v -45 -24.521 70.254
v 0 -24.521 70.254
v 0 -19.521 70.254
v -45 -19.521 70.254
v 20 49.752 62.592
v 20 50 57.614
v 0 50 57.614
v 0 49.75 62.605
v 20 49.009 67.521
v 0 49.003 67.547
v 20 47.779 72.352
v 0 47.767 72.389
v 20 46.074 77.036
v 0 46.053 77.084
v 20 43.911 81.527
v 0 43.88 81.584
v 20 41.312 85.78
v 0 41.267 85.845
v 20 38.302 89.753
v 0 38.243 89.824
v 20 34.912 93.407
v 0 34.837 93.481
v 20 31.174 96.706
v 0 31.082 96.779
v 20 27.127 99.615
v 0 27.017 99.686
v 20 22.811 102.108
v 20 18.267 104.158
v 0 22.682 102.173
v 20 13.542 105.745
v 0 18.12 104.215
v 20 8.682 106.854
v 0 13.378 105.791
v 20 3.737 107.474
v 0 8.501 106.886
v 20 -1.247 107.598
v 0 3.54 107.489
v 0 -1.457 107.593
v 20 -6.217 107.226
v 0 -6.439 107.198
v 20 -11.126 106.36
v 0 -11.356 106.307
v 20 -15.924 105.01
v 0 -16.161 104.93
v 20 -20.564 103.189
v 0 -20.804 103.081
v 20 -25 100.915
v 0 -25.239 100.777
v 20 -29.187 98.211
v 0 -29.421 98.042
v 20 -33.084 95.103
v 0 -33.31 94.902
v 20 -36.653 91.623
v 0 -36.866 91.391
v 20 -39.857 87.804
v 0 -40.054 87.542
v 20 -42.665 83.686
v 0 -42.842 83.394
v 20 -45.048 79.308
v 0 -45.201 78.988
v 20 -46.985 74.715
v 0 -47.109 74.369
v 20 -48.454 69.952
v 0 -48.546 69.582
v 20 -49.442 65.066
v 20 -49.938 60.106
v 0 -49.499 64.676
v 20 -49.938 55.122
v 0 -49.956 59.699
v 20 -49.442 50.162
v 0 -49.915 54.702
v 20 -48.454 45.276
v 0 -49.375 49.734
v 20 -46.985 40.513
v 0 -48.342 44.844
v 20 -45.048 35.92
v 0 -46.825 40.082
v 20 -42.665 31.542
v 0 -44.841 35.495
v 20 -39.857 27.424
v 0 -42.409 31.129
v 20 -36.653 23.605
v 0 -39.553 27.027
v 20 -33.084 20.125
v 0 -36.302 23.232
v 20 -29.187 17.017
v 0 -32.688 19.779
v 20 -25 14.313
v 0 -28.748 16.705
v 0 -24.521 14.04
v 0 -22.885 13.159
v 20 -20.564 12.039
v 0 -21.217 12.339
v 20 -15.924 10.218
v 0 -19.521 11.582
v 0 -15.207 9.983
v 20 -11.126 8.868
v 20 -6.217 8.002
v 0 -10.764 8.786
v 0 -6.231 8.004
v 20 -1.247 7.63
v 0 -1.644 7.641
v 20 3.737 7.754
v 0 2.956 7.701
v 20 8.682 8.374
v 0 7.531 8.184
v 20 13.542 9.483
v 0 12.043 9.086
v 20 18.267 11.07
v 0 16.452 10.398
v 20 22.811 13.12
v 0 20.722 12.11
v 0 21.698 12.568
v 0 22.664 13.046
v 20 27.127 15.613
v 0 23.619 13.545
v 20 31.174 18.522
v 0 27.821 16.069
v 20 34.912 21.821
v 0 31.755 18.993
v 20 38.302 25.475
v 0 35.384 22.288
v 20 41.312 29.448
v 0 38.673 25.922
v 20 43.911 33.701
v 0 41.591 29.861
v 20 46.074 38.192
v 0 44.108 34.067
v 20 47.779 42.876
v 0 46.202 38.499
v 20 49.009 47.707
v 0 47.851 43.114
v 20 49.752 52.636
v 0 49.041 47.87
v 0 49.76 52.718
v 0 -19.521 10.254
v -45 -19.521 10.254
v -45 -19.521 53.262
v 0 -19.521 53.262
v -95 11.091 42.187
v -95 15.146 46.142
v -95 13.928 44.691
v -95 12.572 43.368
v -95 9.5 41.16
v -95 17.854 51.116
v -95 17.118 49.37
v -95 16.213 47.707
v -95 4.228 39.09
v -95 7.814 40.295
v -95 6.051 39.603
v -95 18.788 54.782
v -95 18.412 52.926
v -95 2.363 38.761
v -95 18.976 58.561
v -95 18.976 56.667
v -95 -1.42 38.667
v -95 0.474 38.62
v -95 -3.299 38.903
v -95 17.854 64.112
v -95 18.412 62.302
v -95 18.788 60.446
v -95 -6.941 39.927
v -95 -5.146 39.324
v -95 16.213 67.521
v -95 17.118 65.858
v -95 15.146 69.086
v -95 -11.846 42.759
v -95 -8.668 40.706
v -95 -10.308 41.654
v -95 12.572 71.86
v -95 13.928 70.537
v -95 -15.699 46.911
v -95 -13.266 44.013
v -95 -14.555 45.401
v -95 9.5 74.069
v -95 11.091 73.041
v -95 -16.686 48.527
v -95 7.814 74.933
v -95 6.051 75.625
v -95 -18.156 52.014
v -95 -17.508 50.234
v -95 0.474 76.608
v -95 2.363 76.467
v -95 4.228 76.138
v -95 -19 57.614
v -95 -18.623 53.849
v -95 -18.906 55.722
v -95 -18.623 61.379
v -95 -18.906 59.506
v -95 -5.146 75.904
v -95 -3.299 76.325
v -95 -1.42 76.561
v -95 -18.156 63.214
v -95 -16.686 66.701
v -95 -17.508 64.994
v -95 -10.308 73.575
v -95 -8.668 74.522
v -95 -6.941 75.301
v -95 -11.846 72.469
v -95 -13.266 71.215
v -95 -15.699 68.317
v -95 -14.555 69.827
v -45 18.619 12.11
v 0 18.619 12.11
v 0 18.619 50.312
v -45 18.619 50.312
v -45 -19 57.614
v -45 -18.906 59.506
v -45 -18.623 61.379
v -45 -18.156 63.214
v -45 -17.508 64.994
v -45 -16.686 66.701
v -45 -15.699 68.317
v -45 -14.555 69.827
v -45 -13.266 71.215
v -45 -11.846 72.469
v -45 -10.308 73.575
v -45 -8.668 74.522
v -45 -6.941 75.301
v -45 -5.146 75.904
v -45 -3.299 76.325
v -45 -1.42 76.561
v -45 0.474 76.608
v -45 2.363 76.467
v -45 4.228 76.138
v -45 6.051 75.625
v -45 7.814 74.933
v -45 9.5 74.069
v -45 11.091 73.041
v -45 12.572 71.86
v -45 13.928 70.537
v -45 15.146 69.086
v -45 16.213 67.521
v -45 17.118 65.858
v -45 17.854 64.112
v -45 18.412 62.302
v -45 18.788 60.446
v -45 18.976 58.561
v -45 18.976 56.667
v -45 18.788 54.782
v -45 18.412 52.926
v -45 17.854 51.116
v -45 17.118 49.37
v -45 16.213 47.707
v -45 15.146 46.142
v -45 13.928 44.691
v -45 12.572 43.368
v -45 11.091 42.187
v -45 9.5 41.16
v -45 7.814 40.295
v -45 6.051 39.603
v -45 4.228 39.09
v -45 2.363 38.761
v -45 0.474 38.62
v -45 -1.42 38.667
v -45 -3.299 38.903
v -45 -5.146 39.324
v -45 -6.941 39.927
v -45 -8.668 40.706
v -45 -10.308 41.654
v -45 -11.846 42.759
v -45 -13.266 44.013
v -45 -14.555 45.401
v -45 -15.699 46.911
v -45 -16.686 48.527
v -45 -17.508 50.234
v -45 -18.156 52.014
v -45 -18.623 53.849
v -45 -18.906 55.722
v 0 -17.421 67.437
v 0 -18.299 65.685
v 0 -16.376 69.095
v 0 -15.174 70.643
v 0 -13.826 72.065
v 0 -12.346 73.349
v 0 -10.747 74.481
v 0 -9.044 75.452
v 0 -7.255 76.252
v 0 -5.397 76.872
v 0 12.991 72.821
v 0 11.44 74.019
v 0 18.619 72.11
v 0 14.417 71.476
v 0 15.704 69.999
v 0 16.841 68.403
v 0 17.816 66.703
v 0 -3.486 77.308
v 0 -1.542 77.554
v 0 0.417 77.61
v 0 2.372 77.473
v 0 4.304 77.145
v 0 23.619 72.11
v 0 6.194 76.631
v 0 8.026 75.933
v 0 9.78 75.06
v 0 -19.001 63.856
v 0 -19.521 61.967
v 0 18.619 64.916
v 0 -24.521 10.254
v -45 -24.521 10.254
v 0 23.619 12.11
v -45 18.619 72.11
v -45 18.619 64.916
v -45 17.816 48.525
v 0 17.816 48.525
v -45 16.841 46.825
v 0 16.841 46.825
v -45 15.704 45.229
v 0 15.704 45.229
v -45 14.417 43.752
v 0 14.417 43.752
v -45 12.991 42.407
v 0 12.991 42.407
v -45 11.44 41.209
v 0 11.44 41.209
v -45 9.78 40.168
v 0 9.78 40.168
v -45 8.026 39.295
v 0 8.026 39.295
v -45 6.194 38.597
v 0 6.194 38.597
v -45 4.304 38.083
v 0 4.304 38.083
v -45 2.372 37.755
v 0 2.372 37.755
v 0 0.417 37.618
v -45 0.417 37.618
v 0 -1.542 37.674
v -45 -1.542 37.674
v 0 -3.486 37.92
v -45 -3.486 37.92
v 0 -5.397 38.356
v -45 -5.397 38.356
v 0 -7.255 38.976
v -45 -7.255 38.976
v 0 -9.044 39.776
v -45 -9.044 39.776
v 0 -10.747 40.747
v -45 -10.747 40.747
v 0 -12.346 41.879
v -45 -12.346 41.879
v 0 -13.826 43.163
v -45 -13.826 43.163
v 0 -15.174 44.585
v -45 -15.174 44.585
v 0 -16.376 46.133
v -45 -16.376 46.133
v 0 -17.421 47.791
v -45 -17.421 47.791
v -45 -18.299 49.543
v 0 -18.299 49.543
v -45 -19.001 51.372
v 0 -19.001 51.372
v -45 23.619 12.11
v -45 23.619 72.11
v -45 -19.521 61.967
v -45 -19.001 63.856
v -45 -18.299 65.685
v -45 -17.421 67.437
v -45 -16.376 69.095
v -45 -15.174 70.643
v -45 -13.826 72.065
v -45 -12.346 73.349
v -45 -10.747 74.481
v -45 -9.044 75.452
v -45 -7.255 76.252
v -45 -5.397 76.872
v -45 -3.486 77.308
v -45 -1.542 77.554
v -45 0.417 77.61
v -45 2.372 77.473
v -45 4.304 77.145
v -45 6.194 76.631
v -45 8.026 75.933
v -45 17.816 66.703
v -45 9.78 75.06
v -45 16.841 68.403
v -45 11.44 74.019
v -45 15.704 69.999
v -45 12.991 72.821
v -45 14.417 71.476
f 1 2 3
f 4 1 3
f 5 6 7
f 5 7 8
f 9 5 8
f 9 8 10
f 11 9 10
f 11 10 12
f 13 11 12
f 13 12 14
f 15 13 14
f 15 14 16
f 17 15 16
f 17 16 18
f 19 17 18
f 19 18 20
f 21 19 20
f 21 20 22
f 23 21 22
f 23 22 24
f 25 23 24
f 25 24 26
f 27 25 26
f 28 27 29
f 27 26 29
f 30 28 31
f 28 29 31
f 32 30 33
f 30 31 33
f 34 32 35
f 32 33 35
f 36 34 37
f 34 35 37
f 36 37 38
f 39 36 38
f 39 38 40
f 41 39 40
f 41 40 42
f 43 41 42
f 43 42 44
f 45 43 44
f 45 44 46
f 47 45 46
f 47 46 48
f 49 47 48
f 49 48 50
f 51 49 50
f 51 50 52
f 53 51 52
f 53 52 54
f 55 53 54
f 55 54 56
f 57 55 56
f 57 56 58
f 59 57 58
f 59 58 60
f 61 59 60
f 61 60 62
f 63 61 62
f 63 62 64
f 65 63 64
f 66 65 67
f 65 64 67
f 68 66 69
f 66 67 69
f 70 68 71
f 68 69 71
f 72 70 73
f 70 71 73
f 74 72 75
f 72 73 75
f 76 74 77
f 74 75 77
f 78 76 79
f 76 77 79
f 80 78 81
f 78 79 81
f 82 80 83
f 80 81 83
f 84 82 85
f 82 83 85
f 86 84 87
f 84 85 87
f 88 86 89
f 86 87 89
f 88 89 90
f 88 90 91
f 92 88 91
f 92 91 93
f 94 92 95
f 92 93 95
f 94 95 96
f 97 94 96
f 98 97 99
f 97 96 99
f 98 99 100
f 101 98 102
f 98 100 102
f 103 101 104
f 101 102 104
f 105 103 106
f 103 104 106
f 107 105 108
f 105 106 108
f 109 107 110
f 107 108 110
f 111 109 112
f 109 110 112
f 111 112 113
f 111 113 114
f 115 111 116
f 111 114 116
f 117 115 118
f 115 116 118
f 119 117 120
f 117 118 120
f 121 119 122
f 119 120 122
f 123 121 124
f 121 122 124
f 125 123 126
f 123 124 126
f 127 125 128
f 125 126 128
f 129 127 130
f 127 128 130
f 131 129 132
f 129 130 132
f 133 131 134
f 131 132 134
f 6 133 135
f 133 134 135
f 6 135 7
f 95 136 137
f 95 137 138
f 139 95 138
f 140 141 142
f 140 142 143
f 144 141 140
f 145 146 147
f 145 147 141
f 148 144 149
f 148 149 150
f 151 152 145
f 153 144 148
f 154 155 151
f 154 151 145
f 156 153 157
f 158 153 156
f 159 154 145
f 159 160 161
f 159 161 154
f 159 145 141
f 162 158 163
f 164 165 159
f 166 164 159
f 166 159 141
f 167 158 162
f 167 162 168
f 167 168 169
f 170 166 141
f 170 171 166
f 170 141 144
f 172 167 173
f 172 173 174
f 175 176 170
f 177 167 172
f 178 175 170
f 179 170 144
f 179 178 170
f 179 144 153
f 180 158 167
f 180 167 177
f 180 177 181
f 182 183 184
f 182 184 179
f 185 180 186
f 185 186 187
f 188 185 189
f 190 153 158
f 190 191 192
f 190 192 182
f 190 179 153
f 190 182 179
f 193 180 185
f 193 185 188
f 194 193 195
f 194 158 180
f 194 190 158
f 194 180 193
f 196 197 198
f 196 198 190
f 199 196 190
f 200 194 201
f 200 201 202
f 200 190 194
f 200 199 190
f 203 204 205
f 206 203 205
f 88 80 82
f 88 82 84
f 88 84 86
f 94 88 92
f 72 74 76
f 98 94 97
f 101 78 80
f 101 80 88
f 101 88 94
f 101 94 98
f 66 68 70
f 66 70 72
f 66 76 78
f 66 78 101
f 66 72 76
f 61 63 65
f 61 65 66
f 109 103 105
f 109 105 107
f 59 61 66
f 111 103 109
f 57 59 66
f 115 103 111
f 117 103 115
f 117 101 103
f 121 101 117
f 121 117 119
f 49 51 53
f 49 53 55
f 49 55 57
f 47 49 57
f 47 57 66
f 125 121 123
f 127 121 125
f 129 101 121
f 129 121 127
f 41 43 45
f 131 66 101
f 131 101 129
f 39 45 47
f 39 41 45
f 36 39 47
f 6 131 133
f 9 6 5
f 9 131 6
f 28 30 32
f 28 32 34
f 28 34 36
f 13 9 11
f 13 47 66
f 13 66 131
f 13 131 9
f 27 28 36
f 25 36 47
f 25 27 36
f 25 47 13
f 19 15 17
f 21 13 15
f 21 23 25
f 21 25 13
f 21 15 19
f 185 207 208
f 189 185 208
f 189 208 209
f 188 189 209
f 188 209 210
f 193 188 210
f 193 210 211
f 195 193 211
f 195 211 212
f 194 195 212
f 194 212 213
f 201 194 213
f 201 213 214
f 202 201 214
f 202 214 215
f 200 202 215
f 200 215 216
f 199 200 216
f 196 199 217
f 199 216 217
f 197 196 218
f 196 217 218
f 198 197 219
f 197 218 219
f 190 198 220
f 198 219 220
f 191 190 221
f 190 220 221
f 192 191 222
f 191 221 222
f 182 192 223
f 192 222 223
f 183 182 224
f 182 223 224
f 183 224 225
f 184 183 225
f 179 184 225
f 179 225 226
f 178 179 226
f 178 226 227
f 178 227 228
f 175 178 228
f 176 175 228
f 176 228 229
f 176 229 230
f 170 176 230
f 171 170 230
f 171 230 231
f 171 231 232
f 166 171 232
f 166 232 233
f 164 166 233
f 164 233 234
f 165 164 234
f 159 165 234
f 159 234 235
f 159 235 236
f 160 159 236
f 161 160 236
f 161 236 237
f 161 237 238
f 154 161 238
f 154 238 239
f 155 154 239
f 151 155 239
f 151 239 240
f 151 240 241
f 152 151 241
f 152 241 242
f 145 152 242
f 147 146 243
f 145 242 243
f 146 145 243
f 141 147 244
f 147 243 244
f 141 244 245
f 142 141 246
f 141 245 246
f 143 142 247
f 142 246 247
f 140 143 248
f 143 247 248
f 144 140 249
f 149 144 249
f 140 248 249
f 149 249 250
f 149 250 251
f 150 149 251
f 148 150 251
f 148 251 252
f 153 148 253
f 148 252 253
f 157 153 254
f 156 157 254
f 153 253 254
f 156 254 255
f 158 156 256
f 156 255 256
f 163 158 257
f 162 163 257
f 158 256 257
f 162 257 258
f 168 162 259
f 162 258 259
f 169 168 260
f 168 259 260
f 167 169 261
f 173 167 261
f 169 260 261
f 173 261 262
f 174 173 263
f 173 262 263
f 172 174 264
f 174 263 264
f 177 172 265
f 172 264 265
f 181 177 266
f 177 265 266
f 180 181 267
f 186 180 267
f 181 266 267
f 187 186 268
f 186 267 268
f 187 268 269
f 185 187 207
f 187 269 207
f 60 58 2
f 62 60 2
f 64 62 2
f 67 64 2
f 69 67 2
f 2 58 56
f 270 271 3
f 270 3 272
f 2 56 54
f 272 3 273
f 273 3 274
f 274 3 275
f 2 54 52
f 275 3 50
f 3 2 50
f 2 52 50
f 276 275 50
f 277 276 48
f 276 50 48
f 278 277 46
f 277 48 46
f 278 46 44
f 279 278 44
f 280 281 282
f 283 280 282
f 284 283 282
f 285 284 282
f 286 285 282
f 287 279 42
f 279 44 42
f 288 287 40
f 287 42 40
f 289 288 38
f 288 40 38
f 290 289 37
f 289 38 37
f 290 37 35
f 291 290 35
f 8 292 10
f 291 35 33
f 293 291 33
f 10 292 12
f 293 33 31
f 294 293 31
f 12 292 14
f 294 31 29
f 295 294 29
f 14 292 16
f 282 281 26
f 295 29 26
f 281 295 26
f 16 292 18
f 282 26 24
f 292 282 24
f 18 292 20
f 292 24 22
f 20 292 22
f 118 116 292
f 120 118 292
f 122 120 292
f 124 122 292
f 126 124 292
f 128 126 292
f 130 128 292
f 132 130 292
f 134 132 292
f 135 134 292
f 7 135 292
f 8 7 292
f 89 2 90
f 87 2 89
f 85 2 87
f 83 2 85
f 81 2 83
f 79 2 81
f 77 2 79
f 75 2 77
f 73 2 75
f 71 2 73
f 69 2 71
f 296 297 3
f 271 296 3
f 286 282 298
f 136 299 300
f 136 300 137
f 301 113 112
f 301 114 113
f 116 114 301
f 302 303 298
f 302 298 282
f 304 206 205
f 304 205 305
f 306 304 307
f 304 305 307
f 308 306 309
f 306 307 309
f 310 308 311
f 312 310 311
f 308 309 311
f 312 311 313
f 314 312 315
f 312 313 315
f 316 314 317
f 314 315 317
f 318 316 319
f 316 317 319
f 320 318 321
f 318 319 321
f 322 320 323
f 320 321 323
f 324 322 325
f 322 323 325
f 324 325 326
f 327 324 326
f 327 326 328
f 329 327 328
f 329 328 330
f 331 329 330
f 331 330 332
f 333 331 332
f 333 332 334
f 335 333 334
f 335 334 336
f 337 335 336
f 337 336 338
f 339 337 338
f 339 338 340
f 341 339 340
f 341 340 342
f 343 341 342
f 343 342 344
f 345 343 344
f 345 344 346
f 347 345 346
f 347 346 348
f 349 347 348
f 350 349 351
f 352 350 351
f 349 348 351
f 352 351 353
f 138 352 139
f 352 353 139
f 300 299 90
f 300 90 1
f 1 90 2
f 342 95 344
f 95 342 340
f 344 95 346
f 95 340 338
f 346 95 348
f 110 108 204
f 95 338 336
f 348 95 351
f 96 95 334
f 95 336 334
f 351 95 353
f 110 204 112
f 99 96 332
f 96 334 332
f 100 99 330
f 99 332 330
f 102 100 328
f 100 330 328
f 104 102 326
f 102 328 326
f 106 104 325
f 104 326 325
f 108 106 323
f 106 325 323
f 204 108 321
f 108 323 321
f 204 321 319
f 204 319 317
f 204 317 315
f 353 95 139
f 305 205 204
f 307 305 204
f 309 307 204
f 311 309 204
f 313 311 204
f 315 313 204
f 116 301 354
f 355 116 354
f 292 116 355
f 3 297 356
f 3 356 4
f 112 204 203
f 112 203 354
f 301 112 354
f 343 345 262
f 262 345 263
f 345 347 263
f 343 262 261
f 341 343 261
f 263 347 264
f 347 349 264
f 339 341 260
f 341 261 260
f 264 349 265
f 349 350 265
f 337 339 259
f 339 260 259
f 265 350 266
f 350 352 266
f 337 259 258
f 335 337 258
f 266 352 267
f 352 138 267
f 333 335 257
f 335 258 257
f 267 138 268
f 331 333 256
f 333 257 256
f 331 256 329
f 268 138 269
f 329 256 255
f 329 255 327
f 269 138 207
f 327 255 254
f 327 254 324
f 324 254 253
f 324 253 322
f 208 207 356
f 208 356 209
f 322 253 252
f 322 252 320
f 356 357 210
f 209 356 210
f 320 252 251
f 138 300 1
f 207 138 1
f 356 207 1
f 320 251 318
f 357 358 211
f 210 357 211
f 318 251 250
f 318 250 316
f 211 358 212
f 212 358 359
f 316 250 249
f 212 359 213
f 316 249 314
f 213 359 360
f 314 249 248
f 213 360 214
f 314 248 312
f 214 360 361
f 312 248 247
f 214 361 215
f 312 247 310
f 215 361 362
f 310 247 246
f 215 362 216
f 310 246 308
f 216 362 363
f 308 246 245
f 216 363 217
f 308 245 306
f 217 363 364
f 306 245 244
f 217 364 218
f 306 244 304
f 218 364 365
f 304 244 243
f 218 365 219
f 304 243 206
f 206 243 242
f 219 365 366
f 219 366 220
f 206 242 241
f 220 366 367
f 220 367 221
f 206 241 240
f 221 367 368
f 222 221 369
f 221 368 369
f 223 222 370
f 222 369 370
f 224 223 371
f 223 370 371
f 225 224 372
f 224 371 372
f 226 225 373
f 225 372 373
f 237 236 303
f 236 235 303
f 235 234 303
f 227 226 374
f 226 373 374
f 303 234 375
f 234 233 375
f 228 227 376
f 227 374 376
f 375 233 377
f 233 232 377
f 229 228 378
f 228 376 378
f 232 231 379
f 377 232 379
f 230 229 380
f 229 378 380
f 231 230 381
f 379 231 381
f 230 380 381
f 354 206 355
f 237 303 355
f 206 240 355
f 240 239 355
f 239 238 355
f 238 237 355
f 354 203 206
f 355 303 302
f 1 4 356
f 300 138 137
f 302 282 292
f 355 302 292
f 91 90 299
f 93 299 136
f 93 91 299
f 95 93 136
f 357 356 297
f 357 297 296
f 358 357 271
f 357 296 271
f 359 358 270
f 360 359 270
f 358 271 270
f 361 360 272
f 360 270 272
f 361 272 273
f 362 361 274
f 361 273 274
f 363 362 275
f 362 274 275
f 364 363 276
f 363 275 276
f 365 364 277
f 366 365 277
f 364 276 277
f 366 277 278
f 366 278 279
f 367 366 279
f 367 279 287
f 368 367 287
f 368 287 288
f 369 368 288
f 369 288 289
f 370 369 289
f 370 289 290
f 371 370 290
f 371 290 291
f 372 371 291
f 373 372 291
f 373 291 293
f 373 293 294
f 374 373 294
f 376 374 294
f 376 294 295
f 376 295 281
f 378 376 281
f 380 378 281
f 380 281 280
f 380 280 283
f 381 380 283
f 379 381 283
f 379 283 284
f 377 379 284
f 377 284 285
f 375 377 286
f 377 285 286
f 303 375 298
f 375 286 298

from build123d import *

# Parameters (mm, degrees)
F0_R     = 50
F1_DEPTH = 20
F2_R     = 20
F3_DEPTH = 45
F4_W     = 5
F4_H     = 60
F5_DEPTH = 45
F6_R     = 19
F7_DEPTH = 50
F8_W     = 5
F8_H     = 60
F9_DEPTH = 45


with BuildPart() as f1:
    # F0 (on Right) → F1 (new body)
    with BuildSketch(Plane.YZ):
        with Locations((0, 57.614021)):
            Circle(F0_R)
    extrude(amount=F1_DEPTH)

    # F2 (on face) → F3 (join)
    with BuildSketch(Plane(origin=(0, 0, 0), x_dir=(0, -1, 0), z_dir=(-1, 0, 0))):
        with Locations((0, 57.614021)):
            Circle(F2_R)
    extrude(amount=F3_DEPTH)

    # F4 (on Right) → F5 (join)
    with BuildSketch(Plane.YZ):
        with Locations((-22.020652, 40.254378)):
            Rectangle(F4_W, F4_H)
    extrude(amount=-F5_DEPTH)

    # F6 (on face) → F7 (join)
    with BuildSketch(Plane(origin=(-45, 0, 0), x_dir=(0, -1, 0), z_dir=(-1, 0, 0))):
        with Locations((0, 57.614021)):
            Circle(F6_R)
    extrude(amount=F7_DEPTH)

    # F8 (on Right) → F9 (join)
    with BuildSketch(Plane.YZ):
        with Locations((21.119455, 42.110385)):
            Rectangle(F8_W, F8_H)
    extrude(amount=-F9_DEPTH)


solid = f1.part
